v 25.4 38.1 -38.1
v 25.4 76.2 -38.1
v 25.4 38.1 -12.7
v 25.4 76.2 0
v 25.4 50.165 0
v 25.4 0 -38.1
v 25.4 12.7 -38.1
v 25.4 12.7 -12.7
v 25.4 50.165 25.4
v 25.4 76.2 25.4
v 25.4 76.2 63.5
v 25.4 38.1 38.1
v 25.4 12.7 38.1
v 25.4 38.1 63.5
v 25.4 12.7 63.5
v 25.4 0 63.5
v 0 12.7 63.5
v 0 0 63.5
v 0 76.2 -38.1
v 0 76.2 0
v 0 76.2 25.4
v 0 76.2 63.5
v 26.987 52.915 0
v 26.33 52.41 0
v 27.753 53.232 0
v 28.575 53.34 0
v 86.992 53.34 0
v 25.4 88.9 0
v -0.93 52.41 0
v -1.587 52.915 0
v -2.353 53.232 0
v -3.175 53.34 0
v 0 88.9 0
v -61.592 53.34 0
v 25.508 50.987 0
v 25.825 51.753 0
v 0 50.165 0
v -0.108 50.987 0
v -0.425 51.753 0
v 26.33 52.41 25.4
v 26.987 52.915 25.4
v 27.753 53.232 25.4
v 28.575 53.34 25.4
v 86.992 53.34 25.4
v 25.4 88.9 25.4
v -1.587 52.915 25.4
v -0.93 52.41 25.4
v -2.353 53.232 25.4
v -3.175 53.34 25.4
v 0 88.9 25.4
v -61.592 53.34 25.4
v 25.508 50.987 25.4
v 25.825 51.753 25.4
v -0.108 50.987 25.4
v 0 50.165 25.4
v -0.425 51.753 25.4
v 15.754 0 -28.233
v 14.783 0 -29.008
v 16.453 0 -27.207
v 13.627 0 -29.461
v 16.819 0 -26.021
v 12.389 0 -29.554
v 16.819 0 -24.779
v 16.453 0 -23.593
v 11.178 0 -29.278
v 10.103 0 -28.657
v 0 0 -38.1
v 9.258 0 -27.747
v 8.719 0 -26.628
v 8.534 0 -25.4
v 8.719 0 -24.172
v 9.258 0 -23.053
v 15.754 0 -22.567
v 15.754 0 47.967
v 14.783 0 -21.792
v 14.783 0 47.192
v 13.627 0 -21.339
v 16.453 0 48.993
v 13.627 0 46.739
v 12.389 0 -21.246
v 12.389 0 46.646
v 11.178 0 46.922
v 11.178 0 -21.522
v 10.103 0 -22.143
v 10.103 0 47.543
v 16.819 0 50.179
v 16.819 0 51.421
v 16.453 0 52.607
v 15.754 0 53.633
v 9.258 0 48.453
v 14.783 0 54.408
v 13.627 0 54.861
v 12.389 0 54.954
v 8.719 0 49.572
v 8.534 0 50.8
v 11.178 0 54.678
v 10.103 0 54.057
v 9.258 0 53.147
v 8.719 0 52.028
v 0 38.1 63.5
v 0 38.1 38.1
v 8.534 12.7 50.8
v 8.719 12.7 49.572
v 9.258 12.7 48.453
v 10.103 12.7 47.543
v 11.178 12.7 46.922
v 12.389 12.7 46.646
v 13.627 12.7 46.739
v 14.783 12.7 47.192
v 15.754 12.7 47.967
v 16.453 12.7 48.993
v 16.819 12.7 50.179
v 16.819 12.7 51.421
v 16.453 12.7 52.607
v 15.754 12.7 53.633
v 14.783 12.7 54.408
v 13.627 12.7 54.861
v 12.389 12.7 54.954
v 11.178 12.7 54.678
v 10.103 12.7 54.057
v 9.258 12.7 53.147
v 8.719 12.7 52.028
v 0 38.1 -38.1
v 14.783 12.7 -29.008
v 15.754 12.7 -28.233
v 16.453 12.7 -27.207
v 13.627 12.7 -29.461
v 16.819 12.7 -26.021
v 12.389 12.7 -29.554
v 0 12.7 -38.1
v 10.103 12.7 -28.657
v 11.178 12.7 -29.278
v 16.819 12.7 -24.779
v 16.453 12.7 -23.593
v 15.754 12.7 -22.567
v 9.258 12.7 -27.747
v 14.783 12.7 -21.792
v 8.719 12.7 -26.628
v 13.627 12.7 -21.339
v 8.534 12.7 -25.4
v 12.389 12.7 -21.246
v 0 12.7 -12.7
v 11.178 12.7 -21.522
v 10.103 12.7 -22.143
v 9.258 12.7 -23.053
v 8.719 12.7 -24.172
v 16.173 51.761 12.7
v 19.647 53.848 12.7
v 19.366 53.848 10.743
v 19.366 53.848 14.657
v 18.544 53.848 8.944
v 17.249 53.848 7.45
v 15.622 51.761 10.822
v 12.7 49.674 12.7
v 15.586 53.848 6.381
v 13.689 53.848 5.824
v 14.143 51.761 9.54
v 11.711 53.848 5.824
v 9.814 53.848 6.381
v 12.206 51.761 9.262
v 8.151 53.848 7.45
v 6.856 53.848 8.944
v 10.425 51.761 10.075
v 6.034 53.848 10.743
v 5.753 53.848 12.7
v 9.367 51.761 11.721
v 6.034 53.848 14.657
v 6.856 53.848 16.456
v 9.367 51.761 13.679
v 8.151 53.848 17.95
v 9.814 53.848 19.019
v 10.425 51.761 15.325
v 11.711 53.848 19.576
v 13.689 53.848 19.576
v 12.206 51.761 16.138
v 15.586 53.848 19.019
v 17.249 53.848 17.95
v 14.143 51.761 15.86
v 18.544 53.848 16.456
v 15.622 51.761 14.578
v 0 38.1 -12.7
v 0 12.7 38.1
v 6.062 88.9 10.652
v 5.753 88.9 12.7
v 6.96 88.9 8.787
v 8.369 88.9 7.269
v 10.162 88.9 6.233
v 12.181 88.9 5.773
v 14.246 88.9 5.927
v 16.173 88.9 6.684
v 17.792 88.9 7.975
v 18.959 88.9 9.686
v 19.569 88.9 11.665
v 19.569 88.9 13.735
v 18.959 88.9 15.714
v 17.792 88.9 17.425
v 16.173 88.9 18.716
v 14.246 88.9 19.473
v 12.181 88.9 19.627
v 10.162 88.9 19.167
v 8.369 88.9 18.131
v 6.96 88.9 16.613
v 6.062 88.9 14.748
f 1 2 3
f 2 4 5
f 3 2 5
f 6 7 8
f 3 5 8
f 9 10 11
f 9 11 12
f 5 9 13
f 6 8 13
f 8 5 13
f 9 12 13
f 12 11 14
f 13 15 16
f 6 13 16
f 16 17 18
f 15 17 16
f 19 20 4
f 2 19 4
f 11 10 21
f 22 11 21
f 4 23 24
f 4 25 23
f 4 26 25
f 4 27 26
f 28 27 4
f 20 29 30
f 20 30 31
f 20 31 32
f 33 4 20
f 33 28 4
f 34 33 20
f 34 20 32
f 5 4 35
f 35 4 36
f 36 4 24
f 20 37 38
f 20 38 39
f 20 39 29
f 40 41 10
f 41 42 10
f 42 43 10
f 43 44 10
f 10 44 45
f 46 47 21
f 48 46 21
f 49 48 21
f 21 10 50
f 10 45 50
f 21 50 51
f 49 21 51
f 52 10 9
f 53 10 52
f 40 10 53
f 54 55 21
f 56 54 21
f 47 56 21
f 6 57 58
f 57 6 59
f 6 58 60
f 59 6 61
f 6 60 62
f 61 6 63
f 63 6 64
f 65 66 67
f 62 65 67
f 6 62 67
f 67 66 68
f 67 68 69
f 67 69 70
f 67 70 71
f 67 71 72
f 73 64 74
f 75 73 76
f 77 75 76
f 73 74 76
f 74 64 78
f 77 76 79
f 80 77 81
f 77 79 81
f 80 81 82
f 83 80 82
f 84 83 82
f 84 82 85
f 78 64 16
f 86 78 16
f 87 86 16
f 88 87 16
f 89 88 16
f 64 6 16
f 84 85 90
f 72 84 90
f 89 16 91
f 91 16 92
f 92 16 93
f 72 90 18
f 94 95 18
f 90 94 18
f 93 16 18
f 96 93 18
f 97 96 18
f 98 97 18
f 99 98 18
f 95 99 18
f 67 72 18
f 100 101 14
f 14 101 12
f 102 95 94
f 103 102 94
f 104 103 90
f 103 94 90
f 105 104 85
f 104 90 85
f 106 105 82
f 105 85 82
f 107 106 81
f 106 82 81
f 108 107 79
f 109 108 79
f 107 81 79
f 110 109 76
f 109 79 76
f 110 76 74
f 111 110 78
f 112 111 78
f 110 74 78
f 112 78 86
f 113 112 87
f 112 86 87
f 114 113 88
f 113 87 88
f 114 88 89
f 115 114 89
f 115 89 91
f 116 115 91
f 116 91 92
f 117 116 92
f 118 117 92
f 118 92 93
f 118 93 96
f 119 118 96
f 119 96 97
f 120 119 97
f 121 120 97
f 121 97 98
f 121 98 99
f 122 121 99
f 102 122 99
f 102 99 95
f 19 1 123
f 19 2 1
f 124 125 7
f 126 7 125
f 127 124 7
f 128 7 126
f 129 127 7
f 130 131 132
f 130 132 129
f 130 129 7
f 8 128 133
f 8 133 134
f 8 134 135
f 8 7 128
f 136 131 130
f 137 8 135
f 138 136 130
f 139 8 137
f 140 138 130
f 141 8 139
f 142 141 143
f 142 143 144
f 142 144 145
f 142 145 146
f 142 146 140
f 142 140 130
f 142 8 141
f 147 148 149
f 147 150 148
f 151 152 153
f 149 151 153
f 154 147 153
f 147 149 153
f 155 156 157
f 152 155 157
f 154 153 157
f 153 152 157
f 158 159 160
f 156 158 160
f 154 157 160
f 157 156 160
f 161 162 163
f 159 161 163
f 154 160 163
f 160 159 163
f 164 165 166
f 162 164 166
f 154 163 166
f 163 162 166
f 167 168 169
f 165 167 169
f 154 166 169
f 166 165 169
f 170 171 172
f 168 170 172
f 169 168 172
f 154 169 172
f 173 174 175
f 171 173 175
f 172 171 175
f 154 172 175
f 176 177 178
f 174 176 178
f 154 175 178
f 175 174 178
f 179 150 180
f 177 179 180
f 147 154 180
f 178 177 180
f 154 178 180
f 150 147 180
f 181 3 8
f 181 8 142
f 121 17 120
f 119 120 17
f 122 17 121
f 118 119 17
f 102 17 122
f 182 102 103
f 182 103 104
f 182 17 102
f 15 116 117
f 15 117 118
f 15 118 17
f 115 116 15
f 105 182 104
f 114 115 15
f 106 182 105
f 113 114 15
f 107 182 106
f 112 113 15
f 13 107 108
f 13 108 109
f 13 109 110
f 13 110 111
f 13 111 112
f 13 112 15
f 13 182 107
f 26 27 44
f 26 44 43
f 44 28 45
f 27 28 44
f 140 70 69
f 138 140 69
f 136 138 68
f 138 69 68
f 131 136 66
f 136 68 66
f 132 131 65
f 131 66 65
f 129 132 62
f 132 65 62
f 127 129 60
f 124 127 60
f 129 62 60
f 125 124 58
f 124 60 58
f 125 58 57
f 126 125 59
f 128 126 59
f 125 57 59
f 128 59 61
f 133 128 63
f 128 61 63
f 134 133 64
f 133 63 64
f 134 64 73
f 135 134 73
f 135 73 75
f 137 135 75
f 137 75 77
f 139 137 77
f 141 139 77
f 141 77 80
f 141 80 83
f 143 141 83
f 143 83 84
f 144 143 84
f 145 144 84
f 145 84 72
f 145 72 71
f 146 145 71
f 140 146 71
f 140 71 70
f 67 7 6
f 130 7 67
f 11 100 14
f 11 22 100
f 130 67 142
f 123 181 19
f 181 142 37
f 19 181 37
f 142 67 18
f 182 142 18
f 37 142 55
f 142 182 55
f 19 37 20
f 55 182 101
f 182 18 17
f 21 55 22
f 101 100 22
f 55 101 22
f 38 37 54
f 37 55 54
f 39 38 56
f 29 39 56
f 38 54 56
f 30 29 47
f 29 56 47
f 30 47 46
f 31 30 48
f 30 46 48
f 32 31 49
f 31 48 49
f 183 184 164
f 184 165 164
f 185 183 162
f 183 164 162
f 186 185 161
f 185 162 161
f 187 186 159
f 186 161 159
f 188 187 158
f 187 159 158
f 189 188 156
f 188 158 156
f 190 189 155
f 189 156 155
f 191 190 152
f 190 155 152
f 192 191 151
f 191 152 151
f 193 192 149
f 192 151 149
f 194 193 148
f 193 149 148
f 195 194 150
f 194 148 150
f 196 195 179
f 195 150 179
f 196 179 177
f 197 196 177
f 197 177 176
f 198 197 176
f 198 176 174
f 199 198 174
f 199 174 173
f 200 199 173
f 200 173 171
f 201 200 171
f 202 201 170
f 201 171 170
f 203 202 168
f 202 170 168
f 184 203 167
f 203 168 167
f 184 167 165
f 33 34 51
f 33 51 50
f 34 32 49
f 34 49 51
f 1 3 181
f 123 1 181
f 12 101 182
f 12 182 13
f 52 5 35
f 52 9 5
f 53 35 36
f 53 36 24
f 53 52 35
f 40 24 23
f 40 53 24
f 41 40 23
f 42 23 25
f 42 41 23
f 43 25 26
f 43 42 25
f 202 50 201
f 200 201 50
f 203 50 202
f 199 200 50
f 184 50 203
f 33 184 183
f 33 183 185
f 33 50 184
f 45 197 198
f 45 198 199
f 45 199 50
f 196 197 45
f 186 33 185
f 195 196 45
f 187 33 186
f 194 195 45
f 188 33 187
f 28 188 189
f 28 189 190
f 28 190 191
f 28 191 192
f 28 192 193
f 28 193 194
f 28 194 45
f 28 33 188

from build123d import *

# Parameters (mm, degrees)
BOSS_EXTRUDE1_DEPTH        = 25.4
SKETCH2_W                  = 25.4
SKETCH2_H                  = 12.7
BOSS_EXTRUDE2_DEPTH        = 38.1
SKETCH3_W                  = 25.4
SKETCH3_H                  = 12.7
BOSS_EXTRUDE3_DEPTH        = 38.1
F_0_328IN_DOWEL_HOLE1_D    = 8.3312
F_0_55IN_DOWEL_HOLE2_D     = 13.8938
F_0_55IN_DOWEL_HOLE2_DEPTH = 35.052
F_0_55IN_DOWEL_HOLE2_TIP   = 4.174118634
FILLET1_R                  = 3.175
SKETCH8_W                  = 25.4
SKETCH8_H                  = 25.4
BOSS_EXTRUDE4_DEPTH        = 12.7
BOSS_EXTRUDE5_DEPTH        = 38.1
SKETCH9_W                  = 25.4
SKETCH9_H                  = 25.4
BOSS_EXTRUDE6_DEPTH        = 12.7
BOSS_EXTRUDE7_DEPTH        = 38.1


with BuildPart() as part:
    # Sketch1 → Boss-Extrude1 (new body)
    with BuildSketch(Plane.XY):
        Polygon((0, 0), (0, 53.34), (-61.591726717, 53.34), (0, 88.9), (25.4, 88.9), (86.991726717, 53.34), (25.4, 53.34), (25.4, 0), align=None)
    extrude(amount=BOSS_EXTRUDE1_DEPTH)

    # Sketch2 → Boss-Extrude2 (add)
    with BuildSketch(Plane.XY.offset(25.4)):
        with Locations((12.7, 6.35)):
            Rectangle(SKETCH2_W, SKETCH2_H)
    extrude(amount=BOSS_EXTRUDE2_DEPTH)

    # Sketch3 → Boss-Extrude3 (add)
    with BuildSketch(Plane(origin=(0, 0, 0), x_dir=(-1, 0, 0), z_dir=(0, 0, -1))):
        with Locations((-12.7, 6.35)):
            Rectangle(SKETCH3_W, SKETCH3_H)
    extrude(amount=BOSS_EXTRUDE3_DEPTH)

    # Ø0.328in Dowel Hole1 (through all)
    with Locations(Plane(origin=(0, 12.7, 0), x_dir=(1, 0, 0), z_dir=(0, 1, 0))):
        with Locations((12.7, 25.4), (12.7, -50.8)):
            Hole(F_0_328IN_DOWEL_HOLE1_D / 2)

    # Ø0.55in Dowel Hole2
    with Locations(Plane(origin=(0, 88.9, 0), x_dir=(1, 0, 0), z_dir=(0, 1, 0))):
        with Locations((12.7, -12.7)):
            Hole(F_0_55IN_DOWEL_HOLE2_D / 2, depth=F_0_55IN_DOWEL_HOLE2_DEPTH)
            with Locations((0, 0, -(F_0_55IN_DOWEL_HOLE2_DEPTH + F_0_55IN_DOWEL_HOLE2_TIP / 2))):  # 118° drill point
                Cone(0, F_0_55IN_DOWEL_HOLE2_D / 2, F_0_55IN_DOWEL_HOLE2_TIP, mode=Mode.SUBTRACT)

    # Fillet1
    fillet1_edges = [part.edges().sort_by_distance(p)[0] for p in [
        (0, 53.34, 12.7),
        (25.4, 53.34, 12.7),
    ]]
    fillet(fillet1_edges, radius=FILLET1_R)

    # Sketch8 → Boss-Extrude4 (add)
    with BuildSketch(Plane.XY.offset(25.4)):
        with Locations((12.7, 25.4)):
            Rectangle(SKETCH8_W, SKETCH8_H)
    extrude(amount=BOSS_EXTRUDE4_DEPTH)

    # Sketch8<3> → Boss-Extrude5 (add)
    with BuildSketch(Plane.XY.offset(25.4)):
        Polygon((0, 50.165), (0, 38.1), (25.4, 38.1), (25.4, 76.2), (0, 76.2), align=None)
    extrude(amount=BOSS_EXTRUDE5_DEPTH)

    # Sketch9 → Boss-Extrude6 (add)
    with BuildSketch(Plane(origin=(0, 0, 0), x_dir=(-1, 0, 0), z_dir=(0, 0, -1))):
        with Locations((-12.7, 25.4)):
            Rectangle(SKETCH9_W, SKETCH9_H)
    extrude(amount=BOSS_EXTRUDE6_DEPTH)

    # Sketch9<3> → Boss-Extrude7 (add)
    with BuildSketch(Plane(origin=(0, 0, 0), x_dir=(-1, 0, 0), z_dir=(0, 0, -1))):
        Polygon((-25.4, 50.165), (-25.4, 38.1), (0, 38.1), (0, 50.165), (0, 76.2), (-25.4, 76.2), align=None)
    extrude(amount=BOSS_EXTRUDE7_DEPTH)


solid = part.part
